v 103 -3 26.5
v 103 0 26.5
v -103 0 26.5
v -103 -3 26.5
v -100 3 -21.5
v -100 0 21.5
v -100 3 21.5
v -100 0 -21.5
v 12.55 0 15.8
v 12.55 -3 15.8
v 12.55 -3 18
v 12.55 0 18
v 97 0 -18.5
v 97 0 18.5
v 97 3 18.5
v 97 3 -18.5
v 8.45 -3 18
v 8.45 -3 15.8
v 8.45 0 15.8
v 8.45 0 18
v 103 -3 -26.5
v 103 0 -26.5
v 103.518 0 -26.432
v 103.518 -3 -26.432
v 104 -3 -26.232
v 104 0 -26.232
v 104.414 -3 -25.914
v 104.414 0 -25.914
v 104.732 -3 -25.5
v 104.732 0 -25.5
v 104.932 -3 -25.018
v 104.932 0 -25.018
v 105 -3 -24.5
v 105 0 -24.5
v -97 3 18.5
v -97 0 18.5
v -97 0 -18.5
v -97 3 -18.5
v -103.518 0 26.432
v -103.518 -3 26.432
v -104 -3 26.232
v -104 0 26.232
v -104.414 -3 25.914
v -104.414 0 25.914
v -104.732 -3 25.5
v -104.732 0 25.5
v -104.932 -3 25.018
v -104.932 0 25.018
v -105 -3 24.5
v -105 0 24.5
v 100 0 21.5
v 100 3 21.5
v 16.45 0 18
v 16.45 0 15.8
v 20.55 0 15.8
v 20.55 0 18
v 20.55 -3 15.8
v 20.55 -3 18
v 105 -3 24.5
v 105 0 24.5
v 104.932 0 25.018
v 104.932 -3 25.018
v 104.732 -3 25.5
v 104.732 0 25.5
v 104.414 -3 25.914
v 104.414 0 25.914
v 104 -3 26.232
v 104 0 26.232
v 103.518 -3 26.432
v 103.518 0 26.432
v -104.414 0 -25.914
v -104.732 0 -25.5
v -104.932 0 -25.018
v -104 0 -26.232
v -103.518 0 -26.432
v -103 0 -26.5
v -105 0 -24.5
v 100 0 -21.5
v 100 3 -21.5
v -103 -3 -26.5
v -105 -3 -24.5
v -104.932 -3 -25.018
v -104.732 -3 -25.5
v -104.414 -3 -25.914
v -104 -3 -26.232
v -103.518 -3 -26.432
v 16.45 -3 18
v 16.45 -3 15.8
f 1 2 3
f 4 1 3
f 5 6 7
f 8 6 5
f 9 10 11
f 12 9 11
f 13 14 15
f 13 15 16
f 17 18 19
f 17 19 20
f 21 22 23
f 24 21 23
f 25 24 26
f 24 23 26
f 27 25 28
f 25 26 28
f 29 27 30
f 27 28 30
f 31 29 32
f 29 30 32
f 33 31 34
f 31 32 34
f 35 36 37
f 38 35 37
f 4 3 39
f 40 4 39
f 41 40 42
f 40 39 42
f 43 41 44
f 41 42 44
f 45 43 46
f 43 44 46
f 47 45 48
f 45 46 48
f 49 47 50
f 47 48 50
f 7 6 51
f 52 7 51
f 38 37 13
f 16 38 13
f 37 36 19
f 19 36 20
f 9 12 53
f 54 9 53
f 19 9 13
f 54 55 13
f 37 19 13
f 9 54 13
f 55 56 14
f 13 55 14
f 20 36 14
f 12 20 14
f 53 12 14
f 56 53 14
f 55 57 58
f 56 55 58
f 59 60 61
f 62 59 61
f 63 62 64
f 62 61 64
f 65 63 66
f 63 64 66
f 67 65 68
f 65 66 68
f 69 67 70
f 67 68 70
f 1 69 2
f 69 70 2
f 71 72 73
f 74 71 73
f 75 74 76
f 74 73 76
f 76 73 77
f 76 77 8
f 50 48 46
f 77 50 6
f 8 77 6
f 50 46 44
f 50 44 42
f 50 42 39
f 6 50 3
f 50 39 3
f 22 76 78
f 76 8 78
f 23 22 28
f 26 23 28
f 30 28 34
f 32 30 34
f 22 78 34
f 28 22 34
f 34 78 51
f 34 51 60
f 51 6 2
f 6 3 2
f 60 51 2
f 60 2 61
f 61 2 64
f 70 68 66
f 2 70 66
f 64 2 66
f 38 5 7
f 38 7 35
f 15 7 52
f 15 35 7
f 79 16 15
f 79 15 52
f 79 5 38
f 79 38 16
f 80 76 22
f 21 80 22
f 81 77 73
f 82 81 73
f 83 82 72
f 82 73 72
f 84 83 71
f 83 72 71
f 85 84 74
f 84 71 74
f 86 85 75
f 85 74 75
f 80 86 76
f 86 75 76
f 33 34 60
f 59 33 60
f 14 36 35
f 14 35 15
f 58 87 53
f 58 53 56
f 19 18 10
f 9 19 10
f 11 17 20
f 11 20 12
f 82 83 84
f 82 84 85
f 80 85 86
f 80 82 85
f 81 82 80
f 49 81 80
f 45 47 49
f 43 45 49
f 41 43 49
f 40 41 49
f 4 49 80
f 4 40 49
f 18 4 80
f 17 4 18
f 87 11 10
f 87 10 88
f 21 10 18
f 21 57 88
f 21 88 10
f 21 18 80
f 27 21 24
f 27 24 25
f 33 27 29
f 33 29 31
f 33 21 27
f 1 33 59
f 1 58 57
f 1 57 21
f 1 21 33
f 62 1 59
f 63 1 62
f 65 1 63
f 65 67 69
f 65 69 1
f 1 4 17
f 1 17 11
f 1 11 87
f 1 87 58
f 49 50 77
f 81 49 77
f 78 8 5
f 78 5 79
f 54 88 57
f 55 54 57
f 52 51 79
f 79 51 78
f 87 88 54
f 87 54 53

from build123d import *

# Parameters (mm, degrees)
SKETCH_228_W        = 210
SKETCH_228_H        = 53
EXTRUDE_1_DEPTH     = 50
SKETCH_3_W          = 200
SKETCH_3_H          = 43
CUT_EXTRUDE_1_DEPTH = 45
SKETCH_4_R          = 3.5
EXTRUDE_2_DEPTH     = 2
EXTRUDE_2_TAPER     = 1
FILLET_2_R          = 0.5
SKETCH_4_5_R        = 3.5
EXTRUDE_3_DEPTH     = 2
SKETCH_4_6_R        = 3.5
EXTRUDE_4_DEPTH     = 2
SKETCH_4_7_R        = 3.5
EXTRUDE_5_DEPTH     = 2
FILLET_3_R          = 0.5
FILLET_4_R          = 0.5
FILLET_5_R          = 0.5
SKETCH_7_R          = 6
CUT_EXTRUDE_2_DEPTH = 14
CUT_EXTRUDE_2_DRAFT = -5
FILLET_6_R          = 2
SKETCH_8_R          = 7
EXTRUDE_6_DEPTH     = 7
EXTRUDE_6_TAPER     = 5
SKETCH_9_R          = 5.15
CUT_EXTRUDE_3_DEPTH = 7
CUT_EXTRUDE_3_DRAFT = 5
SKETCH_10_W         = 29.4
SKETCH_10_H         = 26.3
CUT_EXTRUDE_4_DEPTH = 5
SKETCH_13_W         = 39.2
SKETCH_13_H         = 27.5
CUT_EXTRUDE_5_DEPTH = 2
SKETCH_14_W         = 6
SKETCH_14_H         = 6
CUT_EXTRUDE_6_DEPTH = 5
FILLET_7_R          = 2
EXTRUDE_8_DEPTH     = 3
SKETCH_18_W         = 200
SKETCH_18_H         = 43
SKETCH_18_W_2       = 194
SKETCH_18_H_2       = 37
EXTRUDE_4681_DEPTH  = 3
SKETCH_21_W         = 4.1
SKETCH_21_H         = 2.2
CUT_EXTRUDE_7_DEPTH = 3


with BuildPart() as part:
    # Sketch 228 → Бобышка-Вытянуть1 (new body)
    with BuildSketch(Plane(origin=(0, 0, 0), x_dir=(1, 0, 0), z_dir=(0, 1, 0))):
        Rectangle(SKETCH_228_W, SKETCH_228_H)
    extrude(amount=EXTRUDE_1_DEPTH)

    # Эскиз3 → Вырез-Вытянуть1 (cut)
    with BuildSketch(Plane.XZ):
        Rectangle(SKETCH_3_W, SKETCH_3_H)
    extrude(amount=-CUT_EXTRUDE_1_DEPTH, mode=Mode.SUBTRACT)

    # Эскиз4 → Бобышка-Вытянуть2 (add)
    with BuildSketch(Plane(origin=(0, 50, 0), x_dir=(1, 0, 0), z_dir=(0, 1, 0))):
        with Locations((98, 19.5)):
            Circle(SKETCH_4_R)
    extrude(amount=EXTRUDE_2_DEPTH, taper=EXTRUDE_2_TAPER)

    # Скругление2
    fillet_2_edges = [part.edges().sort_by_distance(p)[0] for p in [
        (94.53491013, 52, -19.5),
    ]]
    fillet(fillet_2_edges, radius=FILLET_2_R)

    # Эскиз4<5> → Бобышка-Вытянуть3 (add)
    with BuildSketch(Plane(origin=(0, 50, 0), x_dir=(1, 0, 0), z_dir=(0, 1, 0))):
        with Locations(Location((98, -19.5, 0), (0, 0, 90))):
            Circle(SKETCH_4_5_R)
    extrude(amount=EXTRUDE_3_DEPTH)

    # Эскиз4<6> → Бобышка-Вытянуть4 (add)
    with BuildSketch(Plane(origin=(0, 50, 0), x_dir=(1, 0, 0), z_dir=(0, 1, 0))):
        with Locations(Location((-98, -19.5, 0), (0, 0, 270))):
            Circle(SKETCH_4_6_R)
    extrude(amount=EXTRUDE_4_DEPTH)

    # Эскиз4<7> → Бобышка-Вытянуть5 (add)
    with BuildSketch(Plane(origin=(0, 50, 0), x_dir=(1, 0, 0), z_dir=(0, 1, 0))):
        with Locations(Location((-98, 19.5, 0), (0, 0, 90))):
            Circle(SKETCH_4_7_R)
    extrude(amount=EXTRUDE_5_DEPTH)

    # Скругление3
    fillet_3_edges = [part.edges().sort_by_distance(p)[0] for p in [
        (-98, 52, 16),
    ]]
    fillet(fillet_3_edges, radius=FILLET_3_R)

    # Скругление4
    fillet_4_edges = [part.edges().sort_by_distance(p)[0] for p in [
        (-98, 52, -16),
    ]]
    fillet(fillet_4_edges, radius=FILLET_4_R)

    # Скругление5
    fillet_5_edges = [part.edges().sort_by_distance(p)[0] for p in [
        (98, 52, 23),
    ]]
    fillet(fillet_5_edges, radius=FILLET_5_R)


with BuildPart() as cut_extrude_2_tool:
    # Эскиз7 → Вырез-Вытянуть2 (with draft: the straight prism first)
    with BuildSketch(Plane(origin=(0, 0, -26.5), x_dir=(-1, 0, 0), z_dir=(0, 0, -1))):
        with Locations((0, 35.081888724)):
            Circle(SKETCH_7_R)
    extrude(amount=-CUT_EXTRUDE_2_DEPTH)
    # Вырез-Вытянуть2: the draft: its side faces are tilted about the plane it starts from
    cut_extrude_2_sides = [cut_extrude_2_tool.faces().sort_by_distance(p)[0] for p in [
        (6, 35.081888724, -19.5),
    ]]
    draft(cut_extrude_2_sides, Plane(origin=(0, 0, -26.5), x_dir=(-1, 0, 0), z_dir=(0, 0, -1)), CUT_EXTRUDE_2_DRAFT)


with BuildPart() as part_1:
    add(part.part)

    # Вырез-Вытянуть2: cut by cut_extrude_2_tool
    add(cut_extrude_2_tool.part, mode=Mode.SUBTRACT)

    # Скругление6
    fillet_6_edges = [part_1.edges().sort_by_distance(p)[0] for p in [
        (6, 35.081888724, -26.5),
    ]]
    fillet(fillet_6_edges, radius=FILLET_6_R)

    # Эскиз8 → Бобышка-Вытянуть6 (add)
    with BuildSketch(Plane.XY.offset(-21.5)):
        with Locations((0, 35.081888724)):
            Circle(SKETCH_8_R)
    extrude(amount=EXTRUDE_6_DEPTH, taper=EXTRUDE_6_TAPER)


with BuildPart() as cut_extrude_3_tool:
    # Эскиз9 → Вырез-Вытянуть3 (with draft: the straight prism first)
    with BuildSketch(Plane.XY.offset(-14.5)):
        with Locations((0, 35.081888724)):
            Circle(SKETCH_9_R)
    extrude(amount=-CUT_EXTRUDE_3_DEPTH)
    # Вырез-Вытянуть3: the draft: its side faces are tilted about the plane it starts from
    cut_extrude_3_sides = [cut_extrude_3_tool.faces().sort_by_distance(p)[0] for p in [
        (-5.15, 35.081888724, -18),
    ]]
    draft(cut_extrude_3_sides, Plane.XY.offset(-14.5), CUT_EXTRUDE_3_DRAFT)


with BuildPart() as part_2:
    add(part_1.part)

    # Вырез-Вытянуть3: cut by cut_extrude_3_tool
    add(cut_extrude_3_tool.part, mode=Mode.SUBTRACT)

    # Эскиз10 → Вырез-Вытянуть4 (cut)
    with BuildSketch(Plane.XY.offset(26.5)):
        with Locations((-50, 25)):
            Rectangle(SKETCH_10_W, SKETCH_10_H)
    extrude(amount=-CUT_EXTRUDE_4_DEPTH, mode=Mode.SUBTRACT)

    # Эскиз13 → Вырез-Вытянуть5 (cut)
    with BuildSketch(Plane(origin=(0, 0, 21.5), x_dir=(-1, 0, 0), z_dir=(0, 0, -1))):
        with Locations((50, 25)):
            Rectangle(SKETCH_13_W, SKETCH_13_H)
    extrude(amount=-CUT_EXTRUDE_5_DEPTH, mode=Mode.SUBTRACT)

    # Эскиз14 → Вырез-Вытянуть6 (cut)
    with BuildSketch(Plane.XY.offset(26.5)):
        with Locations((-76.5, 31.8)):
            Rectangle(SKETCH_14_W, SKETCH_14_H)
        with Locations((-76.5, 18.2)):
            Rectangle(SKETCH_14_W, SKETCH_14_H)
    extrude(amount=-CUT_EXTRUDE_6_DEPTH, mode=Mode.SUBTRACT)

    # Скругление7
    fillet_7_edges = [part_2.edges().sort_by_distance(p)[0] for p in [
        (-105, 50, 0),
        (0, 50, 26.5),
        (105, 50, 0),
        (105, 25, 26.5),
        (-105, 25, 26.5),
        (-105, 25, -26.5),
        (105, 25, -26.5),
        (0, 50, -26.5),
    ]]
    fillet(fillet_7_edges, radius=FILLET_7_R)


with BuildPart() as body_2:
    # Эскиз17 → Бобышка-Вытянуть8 (new body)
    with BuildSketch(Plane.XZ):
        with BuildLine():
            Line((-105, 24.5), (-105, -24.5))
            ThreePointArc((-105, -24.5), (-104.414213562, -25.914213562), (-103, -26.5))
            Line((-103, -26.5), (103, -26.5))
            ThreePointArc((103, -26.5), (104.414213562, -25.914213562), (105, -24.5))
            Line((105, -24.5), (105, 24.5))
            ThreePointArc((105, 24.5), (104.414213562, 25.914213562), (103, 26.5))
            Line((103, 26.5), (-103, 26.5))
            ThreePointArc((-103, 26.5), (-104.414213562, 25.914213562), (-105, 24.5))
        make_face()
    extrude(amount=EXTRUDE_8_DEPTH)

    # Эскиз18 → Extrude 4681 (add)
    with BuildSketch(Plane(origin=(0, 0, 0), x_dir=(1, 0, 0), z_dir=(0, 1, 0))):
        Rectangle(SKETCH_18_W, SKETCH_18_H)
        Rectangle(SKETCH_18_W_2, SKETCH_18_H_2, mode=Mode.SUBTRACT)
    extrude(amount=EXTRUDE_4681_DEPTH)

    # Эскиз21 → Вырез-Вытянуть7 (cut)
    with BuildSketch(Plane.XZ.offset(3)):
        with Locations((10.5, 16.9)):
            Rectangle(SKETCH_21_W, SKETCH_21_H)
        with Locations((18.5, 16.9)):
            Rectangle(SKETCH_21_W, SKETCH_21_H)
    extrude(amount=-CUT_EXTRUDE_7_DEPTH, mode=Mode.SUBTRACT)


solid = body_2.part
